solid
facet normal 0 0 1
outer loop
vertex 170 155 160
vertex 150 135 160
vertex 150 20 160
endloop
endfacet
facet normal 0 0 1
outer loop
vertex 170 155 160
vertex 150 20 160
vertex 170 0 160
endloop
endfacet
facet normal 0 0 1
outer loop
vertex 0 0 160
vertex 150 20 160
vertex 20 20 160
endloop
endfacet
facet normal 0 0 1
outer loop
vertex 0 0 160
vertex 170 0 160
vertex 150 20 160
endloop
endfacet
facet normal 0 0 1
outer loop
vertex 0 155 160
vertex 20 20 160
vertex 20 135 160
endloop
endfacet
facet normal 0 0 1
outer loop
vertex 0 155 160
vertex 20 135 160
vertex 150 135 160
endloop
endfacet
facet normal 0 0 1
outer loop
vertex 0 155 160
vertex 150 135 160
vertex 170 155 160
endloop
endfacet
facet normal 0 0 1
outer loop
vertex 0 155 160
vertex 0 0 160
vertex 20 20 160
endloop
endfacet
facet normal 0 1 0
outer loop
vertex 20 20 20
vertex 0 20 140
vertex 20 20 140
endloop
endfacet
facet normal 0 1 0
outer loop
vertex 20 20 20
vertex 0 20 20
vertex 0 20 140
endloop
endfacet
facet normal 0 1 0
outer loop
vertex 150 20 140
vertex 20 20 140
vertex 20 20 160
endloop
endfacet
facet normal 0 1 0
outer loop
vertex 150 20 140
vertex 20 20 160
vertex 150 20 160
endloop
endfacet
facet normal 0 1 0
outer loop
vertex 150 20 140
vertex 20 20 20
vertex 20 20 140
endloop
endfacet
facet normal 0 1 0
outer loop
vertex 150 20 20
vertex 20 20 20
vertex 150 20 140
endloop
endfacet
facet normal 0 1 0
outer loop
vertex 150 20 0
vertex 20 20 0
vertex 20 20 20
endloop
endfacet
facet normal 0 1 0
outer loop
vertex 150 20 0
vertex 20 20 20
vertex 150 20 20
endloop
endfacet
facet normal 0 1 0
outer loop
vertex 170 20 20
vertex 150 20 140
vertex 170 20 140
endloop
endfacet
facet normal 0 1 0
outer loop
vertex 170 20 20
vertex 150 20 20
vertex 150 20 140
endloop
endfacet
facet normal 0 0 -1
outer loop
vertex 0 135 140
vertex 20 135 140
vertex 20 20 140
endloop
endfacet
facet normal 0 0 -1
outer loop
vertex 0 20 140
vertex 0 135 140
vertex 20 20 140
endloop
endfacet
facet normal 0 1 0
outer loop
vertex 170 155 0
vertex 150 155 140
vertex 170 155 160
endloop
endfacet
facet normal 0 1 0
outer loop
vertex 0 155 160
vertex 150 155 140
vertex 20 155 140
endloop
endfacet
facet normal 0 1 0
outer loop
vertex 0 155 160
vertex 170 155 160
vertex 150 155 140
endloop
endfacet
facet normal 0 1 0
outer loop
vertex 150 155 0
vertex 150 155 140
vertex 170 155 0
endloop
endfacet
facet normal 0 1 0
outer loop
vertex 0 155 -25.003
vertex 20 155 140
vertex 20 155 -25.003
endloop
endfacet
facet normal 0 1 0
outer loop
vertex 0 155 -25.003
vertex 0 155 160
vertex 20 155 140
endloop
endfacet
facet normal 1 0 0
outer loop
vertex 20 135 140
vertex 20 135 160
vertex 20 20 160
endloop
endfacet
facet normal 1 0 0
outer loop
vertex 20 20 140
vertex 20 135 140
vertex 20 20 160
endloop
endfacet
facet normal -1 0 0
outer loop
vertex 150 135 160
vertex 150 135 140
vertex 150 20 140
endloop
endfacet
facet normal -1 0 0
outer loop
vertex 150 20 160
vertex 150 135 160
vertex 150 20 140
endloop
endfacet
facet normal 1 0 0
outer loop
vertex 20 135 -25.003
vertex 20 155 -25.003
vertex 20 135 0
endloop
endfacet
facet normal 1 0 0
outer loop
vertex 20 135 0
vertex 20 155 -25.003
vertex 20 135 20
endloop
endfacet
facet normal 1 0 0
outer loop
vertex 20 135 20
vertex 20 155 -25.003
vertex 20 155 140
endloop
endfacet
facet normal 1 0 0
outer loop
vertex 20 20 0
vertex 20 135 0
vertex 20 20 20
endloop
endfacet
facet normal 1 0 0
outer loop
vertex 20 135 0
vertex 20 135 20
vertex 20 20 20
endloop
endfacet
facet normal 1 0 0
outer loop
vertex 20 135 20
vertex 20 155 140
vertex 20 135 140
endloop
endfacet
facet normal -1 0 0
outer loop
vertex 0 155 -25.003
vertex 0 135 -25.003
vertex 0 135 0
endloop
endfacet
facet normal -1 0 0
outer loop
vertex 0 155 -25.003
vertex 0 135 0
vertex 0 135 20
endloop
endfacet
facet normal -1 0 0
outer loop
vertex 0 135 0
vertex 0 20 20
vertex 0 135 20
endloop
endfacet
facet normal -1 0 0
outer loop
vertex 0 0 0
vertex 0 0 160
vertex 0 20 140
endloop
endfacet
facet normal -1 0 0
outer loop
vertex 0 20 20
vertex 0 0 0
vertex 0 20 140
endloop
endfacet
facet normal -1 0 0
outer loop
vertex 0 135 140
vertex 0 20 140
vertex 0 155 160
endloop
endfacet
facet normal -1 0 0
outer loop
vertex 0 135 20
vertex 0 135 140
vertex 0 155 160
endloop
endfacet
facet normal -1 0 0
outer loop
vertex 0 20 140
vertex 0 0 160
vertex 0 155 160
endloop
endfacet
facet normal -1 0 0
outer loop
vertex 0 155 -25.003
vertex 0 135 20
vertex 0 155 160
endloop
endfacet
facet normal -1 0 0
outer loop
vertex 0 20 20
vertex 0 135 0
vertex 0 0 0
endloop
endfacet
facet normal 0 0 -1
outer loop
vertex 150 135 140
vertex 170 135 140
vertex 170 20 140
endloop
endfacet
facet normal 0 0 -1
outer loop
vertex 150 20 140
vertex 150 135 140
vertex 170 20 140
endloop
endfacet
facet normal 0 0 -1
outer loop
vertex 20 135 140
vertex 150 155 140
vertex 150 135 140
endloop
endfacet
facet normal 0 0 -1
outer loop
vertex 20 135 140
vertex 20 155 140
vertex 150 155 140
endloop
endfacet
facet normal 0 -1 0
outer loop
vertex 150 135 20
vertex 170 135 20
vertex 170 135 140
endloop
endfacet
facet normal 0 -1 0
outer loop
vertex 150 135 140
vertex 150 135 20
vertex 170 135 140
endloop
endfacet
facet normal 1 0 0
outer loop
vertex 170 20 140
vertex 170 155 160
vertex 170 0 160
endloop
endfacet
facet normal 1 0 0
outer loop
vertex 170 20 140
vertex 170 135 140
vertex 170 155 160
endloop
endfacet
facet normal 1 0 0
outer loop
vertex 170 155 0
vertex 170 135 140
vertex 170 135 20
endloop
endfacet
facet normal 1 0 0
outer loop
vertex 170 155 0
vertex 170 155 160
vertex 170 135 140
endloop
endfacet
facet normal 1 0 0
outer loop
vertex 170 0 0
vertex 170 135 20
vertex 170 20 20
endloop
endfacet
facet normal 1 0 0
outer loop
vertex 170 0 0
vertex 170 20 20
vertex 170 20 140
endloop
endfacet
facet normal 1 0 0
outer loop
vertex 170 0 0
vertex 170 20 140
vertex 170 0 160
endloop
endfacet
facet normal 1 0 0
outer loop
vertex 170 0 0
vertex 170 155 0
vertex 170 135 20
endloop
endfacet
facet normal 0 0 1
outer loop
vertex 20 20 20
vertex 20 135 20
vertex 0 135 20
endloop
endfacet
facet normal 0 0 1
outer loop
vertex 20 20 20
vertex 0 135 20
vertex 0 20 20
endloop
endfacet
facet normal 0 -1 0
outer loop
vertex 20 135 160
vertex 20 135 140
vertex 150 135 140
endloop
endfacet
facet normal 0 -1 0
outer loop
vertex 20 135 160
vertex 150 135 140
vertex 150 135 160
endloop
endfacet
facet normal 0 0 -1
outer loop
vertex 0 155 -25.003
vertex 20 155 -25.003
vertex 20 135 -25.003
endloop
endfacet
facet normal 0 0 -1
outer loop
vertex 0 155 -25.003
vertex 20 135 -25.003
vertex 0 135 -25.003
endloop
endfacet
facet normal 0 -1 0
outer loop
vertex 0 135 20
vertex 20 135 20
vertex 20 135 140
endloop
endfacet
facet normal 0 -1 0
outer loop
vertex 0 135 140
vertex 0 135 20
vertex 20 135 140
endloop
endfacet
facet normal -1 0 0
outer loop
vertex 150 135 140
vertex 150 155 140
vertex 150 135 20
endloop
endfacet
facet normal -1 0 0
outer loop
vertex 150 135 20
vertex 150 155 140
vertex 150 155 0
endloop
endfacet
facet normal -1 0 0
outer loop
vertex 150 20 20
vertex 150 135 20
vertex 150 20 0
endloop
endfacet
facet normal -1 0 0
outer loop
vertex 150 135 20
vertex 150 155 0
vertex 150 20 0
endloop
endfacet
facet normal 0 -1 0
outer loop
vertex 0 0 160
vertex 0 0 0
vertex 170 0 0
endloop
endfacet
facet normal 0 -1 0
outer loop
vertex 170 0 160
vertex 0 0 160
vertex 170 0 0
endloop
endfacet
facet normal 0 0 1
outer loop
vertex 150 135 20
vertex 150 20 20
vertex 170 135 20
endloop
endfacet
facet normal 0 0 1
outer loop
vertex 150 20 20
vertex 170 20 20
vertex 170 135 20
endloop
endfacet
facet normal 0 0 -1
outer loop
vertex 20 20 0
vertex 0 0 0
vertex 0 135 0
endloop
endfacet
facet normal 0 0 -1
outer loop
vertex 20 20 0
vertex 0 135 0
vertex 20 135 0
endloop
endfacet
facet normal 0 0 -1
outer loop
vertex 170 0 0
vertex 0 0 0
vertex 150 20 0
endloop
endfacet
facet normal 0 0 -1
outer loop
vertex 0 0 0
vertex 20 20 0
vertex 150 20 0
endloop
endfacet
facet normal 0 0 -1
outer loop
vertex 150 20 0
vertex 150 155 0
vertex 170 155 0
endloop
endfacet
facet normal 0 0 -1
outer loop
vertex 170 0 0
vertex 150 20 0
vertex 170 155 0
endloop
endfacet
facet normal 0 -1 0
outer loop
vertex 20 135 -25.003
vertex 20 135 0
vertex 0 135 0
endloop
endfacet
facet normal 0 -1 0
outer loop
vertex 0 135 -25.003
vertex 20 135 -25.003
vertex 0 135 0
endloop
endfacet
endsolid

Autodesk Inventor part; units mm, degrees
ref_plane "YZ Plane" through (0, 0, 0) normal (1, 0, 0) x (0, 1, 0)
ref_plane "XZ Plane" through (0, 0, 0) normal (0, 1, 0) x (-1, 0, 0)
ref_plane "XY Plane" through (0, 0, 0) normal (0, 0, 1) x (1, 0, 0)
sketch "Sketch1" plane through (0, 0, 0) normal (0, 0, 1) x (1, 0, 0)
  line L0 (0, 0) -> (170, 0)
  line L1 (170, 0) -> (170, 310)
  line L2 (170, 310) -> (0, 310)
  line L3 (0, 310) -> (0, 0)
  dimension "d0" = 310
  dimension "d1" = 170
extrude "Extrusion1" add sketch "Sketch1" along normal blind 150
sketch "Sketch2" plane through (0, 0, 150) normal (0, 0, 1) x (1, 0, 0)
  line L0 (20, 290) -> (150, 290)
  line L1 (150, 290) -> (150, 20)
  line L2 (150, 20) -> (20, 20)
  line L3 (20, 20) -> (20, 290)
  line L4 (170, 310) -> (0, 310) projected
  line L5 (0, 310) -> (0, 0) projected
  line L6 (0, 0) -> (170, 0) projected
  line L7 (170, 0) -> (170, 310) projected
  dimension "d4" = 20
  dimension "d5" = 20
  dimension "d6" = 20
  dimension "d7" = 20
sketch "Sketch3" plane through (0, 310, 0) normal (0, 1, 0) x (1, 0, 0)
  line L0 (20, -20) -> (150, -20)
  line L1 (150, -20) -> (150, -130)
  line L2 (150, -130) -> (20, -130)
  line L3 (20, -130) -> (20, -20)
  line L4 (170, 0) -> (0, 0) projected
  line L5 (0, 0) -> (0, -150) projected
  line L6 (170, -150) -> (0, -150) projected
  line L7 (170, 0) -> (170, -150) projected
  dimension "d8" = 20
  dimension "d9" = 20
  dimension "d10" = 20
  dimension "d11" = 20
sketch "Sketch4" plane through (170, 0, 0) normal (1, 0, 0) x (0, 0, -1)
  line L0 (-130, 290) -> (-20, 290)
  line L1 (-20, 290) -> (-20, 20)
  line L2 (-20, 20) -> (-130, 20)
  line L3 (-130, 20) -> (-130, 290)
  line L4 (0, 310) -> (-150, 310) projected
  line L5 (-150, 0) -> (-150, 310) projected
  line L6 (0, 0) -> (-150, 0) projected
  line L7 (0, 0) -> (0, 310) projected
  dimension "d12" = 20
  dimension "d13" = 20
  dimension "d14" = 20
  dimension "d15" = 20
extrude "Extrusion2" cut sketch "Sketch4" against normal blind 900 contours L0 L1 L2 L3
extrude "Extrusion3" cut sketch "Sketch2" against normal blind 900 contours L0 L1 L2 L3
extrude "Extrusion4" cut sketch "Sketch3" against normal blind 40 contours L0 L1 L2 L3
sketch "Sketch5" plane through (170, 0, 0) normal (1, 0, 0) x (0, 0, -1)
  line L0 (-150, 0) -> (-150, 310) projected
  line L1 (-150, 310) -> (0, 310)
  line L2 (0, 310) -> (0, 135)
  line L3 (0, 135) -> (-150, 135)
  line L4 (-150, 135) -> (-150, 310)
  point P0 (0, 0)
  point P1 (-150, 135)
  dimension "d22" = 175
extrude "Extrusion5" cut sketch "Sketch5" against normal through all
sketch "Sketch6" plane through (0, 0, 150) normal (0, 0, 1) x (1, 0, 0)
  line L0 (20, 135) -> (0, 135) projected
  line L1 (0, 135) -> (20, 135)
  line L2 (20, 135) -> (20, 20)
  line L3 (0, 20) -> (0, 135)
  line L4 (0, 0) -> (170, 0) projected
  line L5 (0, 0) -> (170, 0)
  line L6 (170, 0) -> (170, 20)
  line L7 (0, 20) -> (0, 0)
  line L8 (150, 135) -> (170, 135)
  line L9 (170, 135) -> (170, 20)
  line L10 (150, 20) -> (150, 135)
  line L11 (20, 20) -> (150, 20) projected
  line L12 (20, 20) -> (150, 20)
extrude "Extrusion6" add sketch "Sketch6" along normal blind 10
sketch "Sketch7" plane through (170, 20, 130) normal (1, 0, 0) x (0, 0, -1)
  line L0 (0, 115) -> (-30, 115) projected
  line L1 (-30, 0) -> (0, 0) projected
  line L2 (0, 115) -> (-10, 115)
  line L3 (-10, 115) -> (-10, 0)
  line L4 (-10, 0) -> (0, 0)
  line L5 (0, 0) -> (0, 115)
  point P0 (130, -20)
  point P1 (-10, 115)
  dimension "d27" = 10
extrude "Extrusion7" cut sketch "Sketch7" against normal through all
sketch "Sketch8" plane through (0, 20, 20) normal (0, 0, 1) x (1, 0, 0)
  line L0 (20, 115) -> (20, 0) projected
  line L1 (0, 115) -> (20, 115)
  line L2 (20, 115) -> (20, 95)
  line L3 (20, 95) -> (0, 95)
  line L4 (0, 95) -> (0, 115)
  point P0 (0, -20)
  dimension "d30" = 20
sketch "Sketch9" plane through (150, 20, 20) normal (0, 0, 1) x (1, 0, 0)
  line L0 (20, 115) -> (20, 0) projected
  line L1 (20, 115) -> (0, 115)
  line L2 (0, 115) -> (0, 95)
  line L3 (0, 95) -> (20, 95)
  line L4 (20, 95) -> (20, 115)
  point P0 (-150, -20)
  point P1 (20, 95)
  dimension "d31" = 20
extrude "Extrusion8" add sketch "Sketch8" along normal up to surface (120 mm away)
extrude "Extrusion9" add sketch "Sketch9" along normal up to surface (120 mm away)
sketch "Sketch10" plane through (0, 135, 0) normal (0, 1, 0) x (1, 0, 0)
  line L0 (0, -160) -> (0, 0) projected
  line L1 (20, 0) -> (20, -160) projected
  line L2 (0, 0) -> (20, 0)
  line L3 (20, 0) -> (20, -160)
  line L4 (20, -160) -> (0, -160)
  line L5 (0, -160) -> (0, 0)
  line L6 (0, 0) -> (170, 0) projected
  line L7 (150, -140) -> (150, -160) projected
  line L8 (170, 0) -> (150, 0)
  line L9 (150, 0) -> (150, -160)
  line L10 (150, -160) -> (170, -160)
  line L11 (170, -160) -> (170, 0)
  point P0 (150, 0)
extrude "Extrusion10" add sketch "Sketch10" along normal blind 10
sketch "Sketch11" plane through (170, 0, 160) normal (1, 0, 0) x (0, 0, -1)
  line L0 (140, 115) -> (20, 115) projected
  line L1 (20, 115) -> (140, 115)
  line L2 (140, 115) -> (140, 125)
  line L3 (140, 125) -> (20, 125)
  line L4 (20, 125) -> (20, 115)
  point P0 (160, 0)
  dimension "d38" = 10
extrude "Extrusion11" cut sketch "Sketch11" against normal through all
sketch "Sketch12" plane through (0, 145, 0) normal (0, 1, 0) x (1, 0, 0)
  line L0 (20, -160) -> (20, -140) projected
  line L1 (0, 0) -> (20, 0)
  line L2 (20, 0) -> (20, -160)
  line L3 (20, -160) -> (0, -160)
  line L4 (0, -160) -> (0, 0)
  line L5 (170, 0) -> (170, -160) projected
  line L6 (170, 0) -> (150, 0)
  line L7 (150, 0) -> (150, -160)
  line L8 (150, -160) -> (170, -160)
  line L9 (170, -160) -> (170, 0)
extrude "Extrusion12" add sketch "Sketch12" along normal blind 5
sketch "Sketch13" plane through (170, 0, 160) normal (1, 0, 0) x (0, 0, -1)
  line L0 (20, 125) -> (140, 125) projected
  line L1 (20, 125) -> (140, 125)
  line L2 (140, 125) -> (140, 130)
  line L3 (140, 130) -> (20, 130)
  line L4 (20, 130) -> (20, 125)
  point P0 (160, 0)
  dimension "d43" = 5
extrude "Extrusion13" cut sketch "Sketch13" against normal through all
sketch "Sketch14" plane through (0, 150, 0) normal (0, 1, 0) x (1, 0, 0)
  line L0 (20, -160) -> (20, -140) projected
  line L1 (0, 0) -> (20, 0)
  line L2 (20, 0) -> (20, -160)
  line L3 (20, -160) -> (0, -160)
  line L4 (0, -160) -> (0, 0)
  line L5 (0, 0) -> (170, 0) projected
  line L6 (150, -160) -> (20, -160) projected
  line L7 (170, 0) -> (150, 0)
  line L8 (150, 0) -> (150, -160)
  line L9 (150, -160) -> (170, -160)
  line L10 (170, -160) -> (170, 0)
extrude "Extrusion14" add sketch "Sketch14" along normal blind 5 contours L3 L4 L1 L2 L0 | L8 L5 L10 L9
sketch "Sketch15" plane through (170, 0, 160) normal (1, 0, 0) x (0, 0, -1)
  line L0 (20, 130) -> (140, 130) projected
  line L1 (20, 130) -> (140, 130)
  line L2 (140, 130) -> (140, 135)
  line L3 (140, 135) -> (20, 135)
  line L4 (20, 135) -> (20, 130)
  point P0 (160, 0)
  dimension "d48" = 5
extrude "Extrusion15" cut sketch "Sketch15" against normal through all
sketch "Sketch17" plane through (0, 0, 0) normal (0, 0, -1) x (-1, 0, 0)
  line L0 (0, 155) -> (-20, 155) projected
  line L1 (0, 155) -> (-20, 155)
  line L2 (-20, 155) -> (-20, 135)
  line L3 (-20, 135) -> (0, 135)
  line L4 (0, 135) -> (0, 155)
  point P0 (0, 0)
  dimension "d52" = 20
extrude "Extrusion16" add sketch "Sketch17" along normal blind 25.003
sketch "Sketch18" plane through (20, 20, 20) normal (1, 0, 0) x (0, 0, -1)
  line L0 (-140, 135) -> (20, 135) projected
  line L1 (-120, 115) -> (0, 115) projected
  line L2 (-140, 135) -> (-120, 135)
  line L3 (-120, 135) -> (-120, 115)
  line L4 (-120, 115) -> (-140, 115)
  line L5 (-140, 115) -> (-140, 135)
  point P0 (20, -20)
  point P1 (-120, 135)
extrude "Extrusion17" add sketch "Sketch18" along normal up to surface (130 mm away)
properties part number "Pump and motor housing new"
